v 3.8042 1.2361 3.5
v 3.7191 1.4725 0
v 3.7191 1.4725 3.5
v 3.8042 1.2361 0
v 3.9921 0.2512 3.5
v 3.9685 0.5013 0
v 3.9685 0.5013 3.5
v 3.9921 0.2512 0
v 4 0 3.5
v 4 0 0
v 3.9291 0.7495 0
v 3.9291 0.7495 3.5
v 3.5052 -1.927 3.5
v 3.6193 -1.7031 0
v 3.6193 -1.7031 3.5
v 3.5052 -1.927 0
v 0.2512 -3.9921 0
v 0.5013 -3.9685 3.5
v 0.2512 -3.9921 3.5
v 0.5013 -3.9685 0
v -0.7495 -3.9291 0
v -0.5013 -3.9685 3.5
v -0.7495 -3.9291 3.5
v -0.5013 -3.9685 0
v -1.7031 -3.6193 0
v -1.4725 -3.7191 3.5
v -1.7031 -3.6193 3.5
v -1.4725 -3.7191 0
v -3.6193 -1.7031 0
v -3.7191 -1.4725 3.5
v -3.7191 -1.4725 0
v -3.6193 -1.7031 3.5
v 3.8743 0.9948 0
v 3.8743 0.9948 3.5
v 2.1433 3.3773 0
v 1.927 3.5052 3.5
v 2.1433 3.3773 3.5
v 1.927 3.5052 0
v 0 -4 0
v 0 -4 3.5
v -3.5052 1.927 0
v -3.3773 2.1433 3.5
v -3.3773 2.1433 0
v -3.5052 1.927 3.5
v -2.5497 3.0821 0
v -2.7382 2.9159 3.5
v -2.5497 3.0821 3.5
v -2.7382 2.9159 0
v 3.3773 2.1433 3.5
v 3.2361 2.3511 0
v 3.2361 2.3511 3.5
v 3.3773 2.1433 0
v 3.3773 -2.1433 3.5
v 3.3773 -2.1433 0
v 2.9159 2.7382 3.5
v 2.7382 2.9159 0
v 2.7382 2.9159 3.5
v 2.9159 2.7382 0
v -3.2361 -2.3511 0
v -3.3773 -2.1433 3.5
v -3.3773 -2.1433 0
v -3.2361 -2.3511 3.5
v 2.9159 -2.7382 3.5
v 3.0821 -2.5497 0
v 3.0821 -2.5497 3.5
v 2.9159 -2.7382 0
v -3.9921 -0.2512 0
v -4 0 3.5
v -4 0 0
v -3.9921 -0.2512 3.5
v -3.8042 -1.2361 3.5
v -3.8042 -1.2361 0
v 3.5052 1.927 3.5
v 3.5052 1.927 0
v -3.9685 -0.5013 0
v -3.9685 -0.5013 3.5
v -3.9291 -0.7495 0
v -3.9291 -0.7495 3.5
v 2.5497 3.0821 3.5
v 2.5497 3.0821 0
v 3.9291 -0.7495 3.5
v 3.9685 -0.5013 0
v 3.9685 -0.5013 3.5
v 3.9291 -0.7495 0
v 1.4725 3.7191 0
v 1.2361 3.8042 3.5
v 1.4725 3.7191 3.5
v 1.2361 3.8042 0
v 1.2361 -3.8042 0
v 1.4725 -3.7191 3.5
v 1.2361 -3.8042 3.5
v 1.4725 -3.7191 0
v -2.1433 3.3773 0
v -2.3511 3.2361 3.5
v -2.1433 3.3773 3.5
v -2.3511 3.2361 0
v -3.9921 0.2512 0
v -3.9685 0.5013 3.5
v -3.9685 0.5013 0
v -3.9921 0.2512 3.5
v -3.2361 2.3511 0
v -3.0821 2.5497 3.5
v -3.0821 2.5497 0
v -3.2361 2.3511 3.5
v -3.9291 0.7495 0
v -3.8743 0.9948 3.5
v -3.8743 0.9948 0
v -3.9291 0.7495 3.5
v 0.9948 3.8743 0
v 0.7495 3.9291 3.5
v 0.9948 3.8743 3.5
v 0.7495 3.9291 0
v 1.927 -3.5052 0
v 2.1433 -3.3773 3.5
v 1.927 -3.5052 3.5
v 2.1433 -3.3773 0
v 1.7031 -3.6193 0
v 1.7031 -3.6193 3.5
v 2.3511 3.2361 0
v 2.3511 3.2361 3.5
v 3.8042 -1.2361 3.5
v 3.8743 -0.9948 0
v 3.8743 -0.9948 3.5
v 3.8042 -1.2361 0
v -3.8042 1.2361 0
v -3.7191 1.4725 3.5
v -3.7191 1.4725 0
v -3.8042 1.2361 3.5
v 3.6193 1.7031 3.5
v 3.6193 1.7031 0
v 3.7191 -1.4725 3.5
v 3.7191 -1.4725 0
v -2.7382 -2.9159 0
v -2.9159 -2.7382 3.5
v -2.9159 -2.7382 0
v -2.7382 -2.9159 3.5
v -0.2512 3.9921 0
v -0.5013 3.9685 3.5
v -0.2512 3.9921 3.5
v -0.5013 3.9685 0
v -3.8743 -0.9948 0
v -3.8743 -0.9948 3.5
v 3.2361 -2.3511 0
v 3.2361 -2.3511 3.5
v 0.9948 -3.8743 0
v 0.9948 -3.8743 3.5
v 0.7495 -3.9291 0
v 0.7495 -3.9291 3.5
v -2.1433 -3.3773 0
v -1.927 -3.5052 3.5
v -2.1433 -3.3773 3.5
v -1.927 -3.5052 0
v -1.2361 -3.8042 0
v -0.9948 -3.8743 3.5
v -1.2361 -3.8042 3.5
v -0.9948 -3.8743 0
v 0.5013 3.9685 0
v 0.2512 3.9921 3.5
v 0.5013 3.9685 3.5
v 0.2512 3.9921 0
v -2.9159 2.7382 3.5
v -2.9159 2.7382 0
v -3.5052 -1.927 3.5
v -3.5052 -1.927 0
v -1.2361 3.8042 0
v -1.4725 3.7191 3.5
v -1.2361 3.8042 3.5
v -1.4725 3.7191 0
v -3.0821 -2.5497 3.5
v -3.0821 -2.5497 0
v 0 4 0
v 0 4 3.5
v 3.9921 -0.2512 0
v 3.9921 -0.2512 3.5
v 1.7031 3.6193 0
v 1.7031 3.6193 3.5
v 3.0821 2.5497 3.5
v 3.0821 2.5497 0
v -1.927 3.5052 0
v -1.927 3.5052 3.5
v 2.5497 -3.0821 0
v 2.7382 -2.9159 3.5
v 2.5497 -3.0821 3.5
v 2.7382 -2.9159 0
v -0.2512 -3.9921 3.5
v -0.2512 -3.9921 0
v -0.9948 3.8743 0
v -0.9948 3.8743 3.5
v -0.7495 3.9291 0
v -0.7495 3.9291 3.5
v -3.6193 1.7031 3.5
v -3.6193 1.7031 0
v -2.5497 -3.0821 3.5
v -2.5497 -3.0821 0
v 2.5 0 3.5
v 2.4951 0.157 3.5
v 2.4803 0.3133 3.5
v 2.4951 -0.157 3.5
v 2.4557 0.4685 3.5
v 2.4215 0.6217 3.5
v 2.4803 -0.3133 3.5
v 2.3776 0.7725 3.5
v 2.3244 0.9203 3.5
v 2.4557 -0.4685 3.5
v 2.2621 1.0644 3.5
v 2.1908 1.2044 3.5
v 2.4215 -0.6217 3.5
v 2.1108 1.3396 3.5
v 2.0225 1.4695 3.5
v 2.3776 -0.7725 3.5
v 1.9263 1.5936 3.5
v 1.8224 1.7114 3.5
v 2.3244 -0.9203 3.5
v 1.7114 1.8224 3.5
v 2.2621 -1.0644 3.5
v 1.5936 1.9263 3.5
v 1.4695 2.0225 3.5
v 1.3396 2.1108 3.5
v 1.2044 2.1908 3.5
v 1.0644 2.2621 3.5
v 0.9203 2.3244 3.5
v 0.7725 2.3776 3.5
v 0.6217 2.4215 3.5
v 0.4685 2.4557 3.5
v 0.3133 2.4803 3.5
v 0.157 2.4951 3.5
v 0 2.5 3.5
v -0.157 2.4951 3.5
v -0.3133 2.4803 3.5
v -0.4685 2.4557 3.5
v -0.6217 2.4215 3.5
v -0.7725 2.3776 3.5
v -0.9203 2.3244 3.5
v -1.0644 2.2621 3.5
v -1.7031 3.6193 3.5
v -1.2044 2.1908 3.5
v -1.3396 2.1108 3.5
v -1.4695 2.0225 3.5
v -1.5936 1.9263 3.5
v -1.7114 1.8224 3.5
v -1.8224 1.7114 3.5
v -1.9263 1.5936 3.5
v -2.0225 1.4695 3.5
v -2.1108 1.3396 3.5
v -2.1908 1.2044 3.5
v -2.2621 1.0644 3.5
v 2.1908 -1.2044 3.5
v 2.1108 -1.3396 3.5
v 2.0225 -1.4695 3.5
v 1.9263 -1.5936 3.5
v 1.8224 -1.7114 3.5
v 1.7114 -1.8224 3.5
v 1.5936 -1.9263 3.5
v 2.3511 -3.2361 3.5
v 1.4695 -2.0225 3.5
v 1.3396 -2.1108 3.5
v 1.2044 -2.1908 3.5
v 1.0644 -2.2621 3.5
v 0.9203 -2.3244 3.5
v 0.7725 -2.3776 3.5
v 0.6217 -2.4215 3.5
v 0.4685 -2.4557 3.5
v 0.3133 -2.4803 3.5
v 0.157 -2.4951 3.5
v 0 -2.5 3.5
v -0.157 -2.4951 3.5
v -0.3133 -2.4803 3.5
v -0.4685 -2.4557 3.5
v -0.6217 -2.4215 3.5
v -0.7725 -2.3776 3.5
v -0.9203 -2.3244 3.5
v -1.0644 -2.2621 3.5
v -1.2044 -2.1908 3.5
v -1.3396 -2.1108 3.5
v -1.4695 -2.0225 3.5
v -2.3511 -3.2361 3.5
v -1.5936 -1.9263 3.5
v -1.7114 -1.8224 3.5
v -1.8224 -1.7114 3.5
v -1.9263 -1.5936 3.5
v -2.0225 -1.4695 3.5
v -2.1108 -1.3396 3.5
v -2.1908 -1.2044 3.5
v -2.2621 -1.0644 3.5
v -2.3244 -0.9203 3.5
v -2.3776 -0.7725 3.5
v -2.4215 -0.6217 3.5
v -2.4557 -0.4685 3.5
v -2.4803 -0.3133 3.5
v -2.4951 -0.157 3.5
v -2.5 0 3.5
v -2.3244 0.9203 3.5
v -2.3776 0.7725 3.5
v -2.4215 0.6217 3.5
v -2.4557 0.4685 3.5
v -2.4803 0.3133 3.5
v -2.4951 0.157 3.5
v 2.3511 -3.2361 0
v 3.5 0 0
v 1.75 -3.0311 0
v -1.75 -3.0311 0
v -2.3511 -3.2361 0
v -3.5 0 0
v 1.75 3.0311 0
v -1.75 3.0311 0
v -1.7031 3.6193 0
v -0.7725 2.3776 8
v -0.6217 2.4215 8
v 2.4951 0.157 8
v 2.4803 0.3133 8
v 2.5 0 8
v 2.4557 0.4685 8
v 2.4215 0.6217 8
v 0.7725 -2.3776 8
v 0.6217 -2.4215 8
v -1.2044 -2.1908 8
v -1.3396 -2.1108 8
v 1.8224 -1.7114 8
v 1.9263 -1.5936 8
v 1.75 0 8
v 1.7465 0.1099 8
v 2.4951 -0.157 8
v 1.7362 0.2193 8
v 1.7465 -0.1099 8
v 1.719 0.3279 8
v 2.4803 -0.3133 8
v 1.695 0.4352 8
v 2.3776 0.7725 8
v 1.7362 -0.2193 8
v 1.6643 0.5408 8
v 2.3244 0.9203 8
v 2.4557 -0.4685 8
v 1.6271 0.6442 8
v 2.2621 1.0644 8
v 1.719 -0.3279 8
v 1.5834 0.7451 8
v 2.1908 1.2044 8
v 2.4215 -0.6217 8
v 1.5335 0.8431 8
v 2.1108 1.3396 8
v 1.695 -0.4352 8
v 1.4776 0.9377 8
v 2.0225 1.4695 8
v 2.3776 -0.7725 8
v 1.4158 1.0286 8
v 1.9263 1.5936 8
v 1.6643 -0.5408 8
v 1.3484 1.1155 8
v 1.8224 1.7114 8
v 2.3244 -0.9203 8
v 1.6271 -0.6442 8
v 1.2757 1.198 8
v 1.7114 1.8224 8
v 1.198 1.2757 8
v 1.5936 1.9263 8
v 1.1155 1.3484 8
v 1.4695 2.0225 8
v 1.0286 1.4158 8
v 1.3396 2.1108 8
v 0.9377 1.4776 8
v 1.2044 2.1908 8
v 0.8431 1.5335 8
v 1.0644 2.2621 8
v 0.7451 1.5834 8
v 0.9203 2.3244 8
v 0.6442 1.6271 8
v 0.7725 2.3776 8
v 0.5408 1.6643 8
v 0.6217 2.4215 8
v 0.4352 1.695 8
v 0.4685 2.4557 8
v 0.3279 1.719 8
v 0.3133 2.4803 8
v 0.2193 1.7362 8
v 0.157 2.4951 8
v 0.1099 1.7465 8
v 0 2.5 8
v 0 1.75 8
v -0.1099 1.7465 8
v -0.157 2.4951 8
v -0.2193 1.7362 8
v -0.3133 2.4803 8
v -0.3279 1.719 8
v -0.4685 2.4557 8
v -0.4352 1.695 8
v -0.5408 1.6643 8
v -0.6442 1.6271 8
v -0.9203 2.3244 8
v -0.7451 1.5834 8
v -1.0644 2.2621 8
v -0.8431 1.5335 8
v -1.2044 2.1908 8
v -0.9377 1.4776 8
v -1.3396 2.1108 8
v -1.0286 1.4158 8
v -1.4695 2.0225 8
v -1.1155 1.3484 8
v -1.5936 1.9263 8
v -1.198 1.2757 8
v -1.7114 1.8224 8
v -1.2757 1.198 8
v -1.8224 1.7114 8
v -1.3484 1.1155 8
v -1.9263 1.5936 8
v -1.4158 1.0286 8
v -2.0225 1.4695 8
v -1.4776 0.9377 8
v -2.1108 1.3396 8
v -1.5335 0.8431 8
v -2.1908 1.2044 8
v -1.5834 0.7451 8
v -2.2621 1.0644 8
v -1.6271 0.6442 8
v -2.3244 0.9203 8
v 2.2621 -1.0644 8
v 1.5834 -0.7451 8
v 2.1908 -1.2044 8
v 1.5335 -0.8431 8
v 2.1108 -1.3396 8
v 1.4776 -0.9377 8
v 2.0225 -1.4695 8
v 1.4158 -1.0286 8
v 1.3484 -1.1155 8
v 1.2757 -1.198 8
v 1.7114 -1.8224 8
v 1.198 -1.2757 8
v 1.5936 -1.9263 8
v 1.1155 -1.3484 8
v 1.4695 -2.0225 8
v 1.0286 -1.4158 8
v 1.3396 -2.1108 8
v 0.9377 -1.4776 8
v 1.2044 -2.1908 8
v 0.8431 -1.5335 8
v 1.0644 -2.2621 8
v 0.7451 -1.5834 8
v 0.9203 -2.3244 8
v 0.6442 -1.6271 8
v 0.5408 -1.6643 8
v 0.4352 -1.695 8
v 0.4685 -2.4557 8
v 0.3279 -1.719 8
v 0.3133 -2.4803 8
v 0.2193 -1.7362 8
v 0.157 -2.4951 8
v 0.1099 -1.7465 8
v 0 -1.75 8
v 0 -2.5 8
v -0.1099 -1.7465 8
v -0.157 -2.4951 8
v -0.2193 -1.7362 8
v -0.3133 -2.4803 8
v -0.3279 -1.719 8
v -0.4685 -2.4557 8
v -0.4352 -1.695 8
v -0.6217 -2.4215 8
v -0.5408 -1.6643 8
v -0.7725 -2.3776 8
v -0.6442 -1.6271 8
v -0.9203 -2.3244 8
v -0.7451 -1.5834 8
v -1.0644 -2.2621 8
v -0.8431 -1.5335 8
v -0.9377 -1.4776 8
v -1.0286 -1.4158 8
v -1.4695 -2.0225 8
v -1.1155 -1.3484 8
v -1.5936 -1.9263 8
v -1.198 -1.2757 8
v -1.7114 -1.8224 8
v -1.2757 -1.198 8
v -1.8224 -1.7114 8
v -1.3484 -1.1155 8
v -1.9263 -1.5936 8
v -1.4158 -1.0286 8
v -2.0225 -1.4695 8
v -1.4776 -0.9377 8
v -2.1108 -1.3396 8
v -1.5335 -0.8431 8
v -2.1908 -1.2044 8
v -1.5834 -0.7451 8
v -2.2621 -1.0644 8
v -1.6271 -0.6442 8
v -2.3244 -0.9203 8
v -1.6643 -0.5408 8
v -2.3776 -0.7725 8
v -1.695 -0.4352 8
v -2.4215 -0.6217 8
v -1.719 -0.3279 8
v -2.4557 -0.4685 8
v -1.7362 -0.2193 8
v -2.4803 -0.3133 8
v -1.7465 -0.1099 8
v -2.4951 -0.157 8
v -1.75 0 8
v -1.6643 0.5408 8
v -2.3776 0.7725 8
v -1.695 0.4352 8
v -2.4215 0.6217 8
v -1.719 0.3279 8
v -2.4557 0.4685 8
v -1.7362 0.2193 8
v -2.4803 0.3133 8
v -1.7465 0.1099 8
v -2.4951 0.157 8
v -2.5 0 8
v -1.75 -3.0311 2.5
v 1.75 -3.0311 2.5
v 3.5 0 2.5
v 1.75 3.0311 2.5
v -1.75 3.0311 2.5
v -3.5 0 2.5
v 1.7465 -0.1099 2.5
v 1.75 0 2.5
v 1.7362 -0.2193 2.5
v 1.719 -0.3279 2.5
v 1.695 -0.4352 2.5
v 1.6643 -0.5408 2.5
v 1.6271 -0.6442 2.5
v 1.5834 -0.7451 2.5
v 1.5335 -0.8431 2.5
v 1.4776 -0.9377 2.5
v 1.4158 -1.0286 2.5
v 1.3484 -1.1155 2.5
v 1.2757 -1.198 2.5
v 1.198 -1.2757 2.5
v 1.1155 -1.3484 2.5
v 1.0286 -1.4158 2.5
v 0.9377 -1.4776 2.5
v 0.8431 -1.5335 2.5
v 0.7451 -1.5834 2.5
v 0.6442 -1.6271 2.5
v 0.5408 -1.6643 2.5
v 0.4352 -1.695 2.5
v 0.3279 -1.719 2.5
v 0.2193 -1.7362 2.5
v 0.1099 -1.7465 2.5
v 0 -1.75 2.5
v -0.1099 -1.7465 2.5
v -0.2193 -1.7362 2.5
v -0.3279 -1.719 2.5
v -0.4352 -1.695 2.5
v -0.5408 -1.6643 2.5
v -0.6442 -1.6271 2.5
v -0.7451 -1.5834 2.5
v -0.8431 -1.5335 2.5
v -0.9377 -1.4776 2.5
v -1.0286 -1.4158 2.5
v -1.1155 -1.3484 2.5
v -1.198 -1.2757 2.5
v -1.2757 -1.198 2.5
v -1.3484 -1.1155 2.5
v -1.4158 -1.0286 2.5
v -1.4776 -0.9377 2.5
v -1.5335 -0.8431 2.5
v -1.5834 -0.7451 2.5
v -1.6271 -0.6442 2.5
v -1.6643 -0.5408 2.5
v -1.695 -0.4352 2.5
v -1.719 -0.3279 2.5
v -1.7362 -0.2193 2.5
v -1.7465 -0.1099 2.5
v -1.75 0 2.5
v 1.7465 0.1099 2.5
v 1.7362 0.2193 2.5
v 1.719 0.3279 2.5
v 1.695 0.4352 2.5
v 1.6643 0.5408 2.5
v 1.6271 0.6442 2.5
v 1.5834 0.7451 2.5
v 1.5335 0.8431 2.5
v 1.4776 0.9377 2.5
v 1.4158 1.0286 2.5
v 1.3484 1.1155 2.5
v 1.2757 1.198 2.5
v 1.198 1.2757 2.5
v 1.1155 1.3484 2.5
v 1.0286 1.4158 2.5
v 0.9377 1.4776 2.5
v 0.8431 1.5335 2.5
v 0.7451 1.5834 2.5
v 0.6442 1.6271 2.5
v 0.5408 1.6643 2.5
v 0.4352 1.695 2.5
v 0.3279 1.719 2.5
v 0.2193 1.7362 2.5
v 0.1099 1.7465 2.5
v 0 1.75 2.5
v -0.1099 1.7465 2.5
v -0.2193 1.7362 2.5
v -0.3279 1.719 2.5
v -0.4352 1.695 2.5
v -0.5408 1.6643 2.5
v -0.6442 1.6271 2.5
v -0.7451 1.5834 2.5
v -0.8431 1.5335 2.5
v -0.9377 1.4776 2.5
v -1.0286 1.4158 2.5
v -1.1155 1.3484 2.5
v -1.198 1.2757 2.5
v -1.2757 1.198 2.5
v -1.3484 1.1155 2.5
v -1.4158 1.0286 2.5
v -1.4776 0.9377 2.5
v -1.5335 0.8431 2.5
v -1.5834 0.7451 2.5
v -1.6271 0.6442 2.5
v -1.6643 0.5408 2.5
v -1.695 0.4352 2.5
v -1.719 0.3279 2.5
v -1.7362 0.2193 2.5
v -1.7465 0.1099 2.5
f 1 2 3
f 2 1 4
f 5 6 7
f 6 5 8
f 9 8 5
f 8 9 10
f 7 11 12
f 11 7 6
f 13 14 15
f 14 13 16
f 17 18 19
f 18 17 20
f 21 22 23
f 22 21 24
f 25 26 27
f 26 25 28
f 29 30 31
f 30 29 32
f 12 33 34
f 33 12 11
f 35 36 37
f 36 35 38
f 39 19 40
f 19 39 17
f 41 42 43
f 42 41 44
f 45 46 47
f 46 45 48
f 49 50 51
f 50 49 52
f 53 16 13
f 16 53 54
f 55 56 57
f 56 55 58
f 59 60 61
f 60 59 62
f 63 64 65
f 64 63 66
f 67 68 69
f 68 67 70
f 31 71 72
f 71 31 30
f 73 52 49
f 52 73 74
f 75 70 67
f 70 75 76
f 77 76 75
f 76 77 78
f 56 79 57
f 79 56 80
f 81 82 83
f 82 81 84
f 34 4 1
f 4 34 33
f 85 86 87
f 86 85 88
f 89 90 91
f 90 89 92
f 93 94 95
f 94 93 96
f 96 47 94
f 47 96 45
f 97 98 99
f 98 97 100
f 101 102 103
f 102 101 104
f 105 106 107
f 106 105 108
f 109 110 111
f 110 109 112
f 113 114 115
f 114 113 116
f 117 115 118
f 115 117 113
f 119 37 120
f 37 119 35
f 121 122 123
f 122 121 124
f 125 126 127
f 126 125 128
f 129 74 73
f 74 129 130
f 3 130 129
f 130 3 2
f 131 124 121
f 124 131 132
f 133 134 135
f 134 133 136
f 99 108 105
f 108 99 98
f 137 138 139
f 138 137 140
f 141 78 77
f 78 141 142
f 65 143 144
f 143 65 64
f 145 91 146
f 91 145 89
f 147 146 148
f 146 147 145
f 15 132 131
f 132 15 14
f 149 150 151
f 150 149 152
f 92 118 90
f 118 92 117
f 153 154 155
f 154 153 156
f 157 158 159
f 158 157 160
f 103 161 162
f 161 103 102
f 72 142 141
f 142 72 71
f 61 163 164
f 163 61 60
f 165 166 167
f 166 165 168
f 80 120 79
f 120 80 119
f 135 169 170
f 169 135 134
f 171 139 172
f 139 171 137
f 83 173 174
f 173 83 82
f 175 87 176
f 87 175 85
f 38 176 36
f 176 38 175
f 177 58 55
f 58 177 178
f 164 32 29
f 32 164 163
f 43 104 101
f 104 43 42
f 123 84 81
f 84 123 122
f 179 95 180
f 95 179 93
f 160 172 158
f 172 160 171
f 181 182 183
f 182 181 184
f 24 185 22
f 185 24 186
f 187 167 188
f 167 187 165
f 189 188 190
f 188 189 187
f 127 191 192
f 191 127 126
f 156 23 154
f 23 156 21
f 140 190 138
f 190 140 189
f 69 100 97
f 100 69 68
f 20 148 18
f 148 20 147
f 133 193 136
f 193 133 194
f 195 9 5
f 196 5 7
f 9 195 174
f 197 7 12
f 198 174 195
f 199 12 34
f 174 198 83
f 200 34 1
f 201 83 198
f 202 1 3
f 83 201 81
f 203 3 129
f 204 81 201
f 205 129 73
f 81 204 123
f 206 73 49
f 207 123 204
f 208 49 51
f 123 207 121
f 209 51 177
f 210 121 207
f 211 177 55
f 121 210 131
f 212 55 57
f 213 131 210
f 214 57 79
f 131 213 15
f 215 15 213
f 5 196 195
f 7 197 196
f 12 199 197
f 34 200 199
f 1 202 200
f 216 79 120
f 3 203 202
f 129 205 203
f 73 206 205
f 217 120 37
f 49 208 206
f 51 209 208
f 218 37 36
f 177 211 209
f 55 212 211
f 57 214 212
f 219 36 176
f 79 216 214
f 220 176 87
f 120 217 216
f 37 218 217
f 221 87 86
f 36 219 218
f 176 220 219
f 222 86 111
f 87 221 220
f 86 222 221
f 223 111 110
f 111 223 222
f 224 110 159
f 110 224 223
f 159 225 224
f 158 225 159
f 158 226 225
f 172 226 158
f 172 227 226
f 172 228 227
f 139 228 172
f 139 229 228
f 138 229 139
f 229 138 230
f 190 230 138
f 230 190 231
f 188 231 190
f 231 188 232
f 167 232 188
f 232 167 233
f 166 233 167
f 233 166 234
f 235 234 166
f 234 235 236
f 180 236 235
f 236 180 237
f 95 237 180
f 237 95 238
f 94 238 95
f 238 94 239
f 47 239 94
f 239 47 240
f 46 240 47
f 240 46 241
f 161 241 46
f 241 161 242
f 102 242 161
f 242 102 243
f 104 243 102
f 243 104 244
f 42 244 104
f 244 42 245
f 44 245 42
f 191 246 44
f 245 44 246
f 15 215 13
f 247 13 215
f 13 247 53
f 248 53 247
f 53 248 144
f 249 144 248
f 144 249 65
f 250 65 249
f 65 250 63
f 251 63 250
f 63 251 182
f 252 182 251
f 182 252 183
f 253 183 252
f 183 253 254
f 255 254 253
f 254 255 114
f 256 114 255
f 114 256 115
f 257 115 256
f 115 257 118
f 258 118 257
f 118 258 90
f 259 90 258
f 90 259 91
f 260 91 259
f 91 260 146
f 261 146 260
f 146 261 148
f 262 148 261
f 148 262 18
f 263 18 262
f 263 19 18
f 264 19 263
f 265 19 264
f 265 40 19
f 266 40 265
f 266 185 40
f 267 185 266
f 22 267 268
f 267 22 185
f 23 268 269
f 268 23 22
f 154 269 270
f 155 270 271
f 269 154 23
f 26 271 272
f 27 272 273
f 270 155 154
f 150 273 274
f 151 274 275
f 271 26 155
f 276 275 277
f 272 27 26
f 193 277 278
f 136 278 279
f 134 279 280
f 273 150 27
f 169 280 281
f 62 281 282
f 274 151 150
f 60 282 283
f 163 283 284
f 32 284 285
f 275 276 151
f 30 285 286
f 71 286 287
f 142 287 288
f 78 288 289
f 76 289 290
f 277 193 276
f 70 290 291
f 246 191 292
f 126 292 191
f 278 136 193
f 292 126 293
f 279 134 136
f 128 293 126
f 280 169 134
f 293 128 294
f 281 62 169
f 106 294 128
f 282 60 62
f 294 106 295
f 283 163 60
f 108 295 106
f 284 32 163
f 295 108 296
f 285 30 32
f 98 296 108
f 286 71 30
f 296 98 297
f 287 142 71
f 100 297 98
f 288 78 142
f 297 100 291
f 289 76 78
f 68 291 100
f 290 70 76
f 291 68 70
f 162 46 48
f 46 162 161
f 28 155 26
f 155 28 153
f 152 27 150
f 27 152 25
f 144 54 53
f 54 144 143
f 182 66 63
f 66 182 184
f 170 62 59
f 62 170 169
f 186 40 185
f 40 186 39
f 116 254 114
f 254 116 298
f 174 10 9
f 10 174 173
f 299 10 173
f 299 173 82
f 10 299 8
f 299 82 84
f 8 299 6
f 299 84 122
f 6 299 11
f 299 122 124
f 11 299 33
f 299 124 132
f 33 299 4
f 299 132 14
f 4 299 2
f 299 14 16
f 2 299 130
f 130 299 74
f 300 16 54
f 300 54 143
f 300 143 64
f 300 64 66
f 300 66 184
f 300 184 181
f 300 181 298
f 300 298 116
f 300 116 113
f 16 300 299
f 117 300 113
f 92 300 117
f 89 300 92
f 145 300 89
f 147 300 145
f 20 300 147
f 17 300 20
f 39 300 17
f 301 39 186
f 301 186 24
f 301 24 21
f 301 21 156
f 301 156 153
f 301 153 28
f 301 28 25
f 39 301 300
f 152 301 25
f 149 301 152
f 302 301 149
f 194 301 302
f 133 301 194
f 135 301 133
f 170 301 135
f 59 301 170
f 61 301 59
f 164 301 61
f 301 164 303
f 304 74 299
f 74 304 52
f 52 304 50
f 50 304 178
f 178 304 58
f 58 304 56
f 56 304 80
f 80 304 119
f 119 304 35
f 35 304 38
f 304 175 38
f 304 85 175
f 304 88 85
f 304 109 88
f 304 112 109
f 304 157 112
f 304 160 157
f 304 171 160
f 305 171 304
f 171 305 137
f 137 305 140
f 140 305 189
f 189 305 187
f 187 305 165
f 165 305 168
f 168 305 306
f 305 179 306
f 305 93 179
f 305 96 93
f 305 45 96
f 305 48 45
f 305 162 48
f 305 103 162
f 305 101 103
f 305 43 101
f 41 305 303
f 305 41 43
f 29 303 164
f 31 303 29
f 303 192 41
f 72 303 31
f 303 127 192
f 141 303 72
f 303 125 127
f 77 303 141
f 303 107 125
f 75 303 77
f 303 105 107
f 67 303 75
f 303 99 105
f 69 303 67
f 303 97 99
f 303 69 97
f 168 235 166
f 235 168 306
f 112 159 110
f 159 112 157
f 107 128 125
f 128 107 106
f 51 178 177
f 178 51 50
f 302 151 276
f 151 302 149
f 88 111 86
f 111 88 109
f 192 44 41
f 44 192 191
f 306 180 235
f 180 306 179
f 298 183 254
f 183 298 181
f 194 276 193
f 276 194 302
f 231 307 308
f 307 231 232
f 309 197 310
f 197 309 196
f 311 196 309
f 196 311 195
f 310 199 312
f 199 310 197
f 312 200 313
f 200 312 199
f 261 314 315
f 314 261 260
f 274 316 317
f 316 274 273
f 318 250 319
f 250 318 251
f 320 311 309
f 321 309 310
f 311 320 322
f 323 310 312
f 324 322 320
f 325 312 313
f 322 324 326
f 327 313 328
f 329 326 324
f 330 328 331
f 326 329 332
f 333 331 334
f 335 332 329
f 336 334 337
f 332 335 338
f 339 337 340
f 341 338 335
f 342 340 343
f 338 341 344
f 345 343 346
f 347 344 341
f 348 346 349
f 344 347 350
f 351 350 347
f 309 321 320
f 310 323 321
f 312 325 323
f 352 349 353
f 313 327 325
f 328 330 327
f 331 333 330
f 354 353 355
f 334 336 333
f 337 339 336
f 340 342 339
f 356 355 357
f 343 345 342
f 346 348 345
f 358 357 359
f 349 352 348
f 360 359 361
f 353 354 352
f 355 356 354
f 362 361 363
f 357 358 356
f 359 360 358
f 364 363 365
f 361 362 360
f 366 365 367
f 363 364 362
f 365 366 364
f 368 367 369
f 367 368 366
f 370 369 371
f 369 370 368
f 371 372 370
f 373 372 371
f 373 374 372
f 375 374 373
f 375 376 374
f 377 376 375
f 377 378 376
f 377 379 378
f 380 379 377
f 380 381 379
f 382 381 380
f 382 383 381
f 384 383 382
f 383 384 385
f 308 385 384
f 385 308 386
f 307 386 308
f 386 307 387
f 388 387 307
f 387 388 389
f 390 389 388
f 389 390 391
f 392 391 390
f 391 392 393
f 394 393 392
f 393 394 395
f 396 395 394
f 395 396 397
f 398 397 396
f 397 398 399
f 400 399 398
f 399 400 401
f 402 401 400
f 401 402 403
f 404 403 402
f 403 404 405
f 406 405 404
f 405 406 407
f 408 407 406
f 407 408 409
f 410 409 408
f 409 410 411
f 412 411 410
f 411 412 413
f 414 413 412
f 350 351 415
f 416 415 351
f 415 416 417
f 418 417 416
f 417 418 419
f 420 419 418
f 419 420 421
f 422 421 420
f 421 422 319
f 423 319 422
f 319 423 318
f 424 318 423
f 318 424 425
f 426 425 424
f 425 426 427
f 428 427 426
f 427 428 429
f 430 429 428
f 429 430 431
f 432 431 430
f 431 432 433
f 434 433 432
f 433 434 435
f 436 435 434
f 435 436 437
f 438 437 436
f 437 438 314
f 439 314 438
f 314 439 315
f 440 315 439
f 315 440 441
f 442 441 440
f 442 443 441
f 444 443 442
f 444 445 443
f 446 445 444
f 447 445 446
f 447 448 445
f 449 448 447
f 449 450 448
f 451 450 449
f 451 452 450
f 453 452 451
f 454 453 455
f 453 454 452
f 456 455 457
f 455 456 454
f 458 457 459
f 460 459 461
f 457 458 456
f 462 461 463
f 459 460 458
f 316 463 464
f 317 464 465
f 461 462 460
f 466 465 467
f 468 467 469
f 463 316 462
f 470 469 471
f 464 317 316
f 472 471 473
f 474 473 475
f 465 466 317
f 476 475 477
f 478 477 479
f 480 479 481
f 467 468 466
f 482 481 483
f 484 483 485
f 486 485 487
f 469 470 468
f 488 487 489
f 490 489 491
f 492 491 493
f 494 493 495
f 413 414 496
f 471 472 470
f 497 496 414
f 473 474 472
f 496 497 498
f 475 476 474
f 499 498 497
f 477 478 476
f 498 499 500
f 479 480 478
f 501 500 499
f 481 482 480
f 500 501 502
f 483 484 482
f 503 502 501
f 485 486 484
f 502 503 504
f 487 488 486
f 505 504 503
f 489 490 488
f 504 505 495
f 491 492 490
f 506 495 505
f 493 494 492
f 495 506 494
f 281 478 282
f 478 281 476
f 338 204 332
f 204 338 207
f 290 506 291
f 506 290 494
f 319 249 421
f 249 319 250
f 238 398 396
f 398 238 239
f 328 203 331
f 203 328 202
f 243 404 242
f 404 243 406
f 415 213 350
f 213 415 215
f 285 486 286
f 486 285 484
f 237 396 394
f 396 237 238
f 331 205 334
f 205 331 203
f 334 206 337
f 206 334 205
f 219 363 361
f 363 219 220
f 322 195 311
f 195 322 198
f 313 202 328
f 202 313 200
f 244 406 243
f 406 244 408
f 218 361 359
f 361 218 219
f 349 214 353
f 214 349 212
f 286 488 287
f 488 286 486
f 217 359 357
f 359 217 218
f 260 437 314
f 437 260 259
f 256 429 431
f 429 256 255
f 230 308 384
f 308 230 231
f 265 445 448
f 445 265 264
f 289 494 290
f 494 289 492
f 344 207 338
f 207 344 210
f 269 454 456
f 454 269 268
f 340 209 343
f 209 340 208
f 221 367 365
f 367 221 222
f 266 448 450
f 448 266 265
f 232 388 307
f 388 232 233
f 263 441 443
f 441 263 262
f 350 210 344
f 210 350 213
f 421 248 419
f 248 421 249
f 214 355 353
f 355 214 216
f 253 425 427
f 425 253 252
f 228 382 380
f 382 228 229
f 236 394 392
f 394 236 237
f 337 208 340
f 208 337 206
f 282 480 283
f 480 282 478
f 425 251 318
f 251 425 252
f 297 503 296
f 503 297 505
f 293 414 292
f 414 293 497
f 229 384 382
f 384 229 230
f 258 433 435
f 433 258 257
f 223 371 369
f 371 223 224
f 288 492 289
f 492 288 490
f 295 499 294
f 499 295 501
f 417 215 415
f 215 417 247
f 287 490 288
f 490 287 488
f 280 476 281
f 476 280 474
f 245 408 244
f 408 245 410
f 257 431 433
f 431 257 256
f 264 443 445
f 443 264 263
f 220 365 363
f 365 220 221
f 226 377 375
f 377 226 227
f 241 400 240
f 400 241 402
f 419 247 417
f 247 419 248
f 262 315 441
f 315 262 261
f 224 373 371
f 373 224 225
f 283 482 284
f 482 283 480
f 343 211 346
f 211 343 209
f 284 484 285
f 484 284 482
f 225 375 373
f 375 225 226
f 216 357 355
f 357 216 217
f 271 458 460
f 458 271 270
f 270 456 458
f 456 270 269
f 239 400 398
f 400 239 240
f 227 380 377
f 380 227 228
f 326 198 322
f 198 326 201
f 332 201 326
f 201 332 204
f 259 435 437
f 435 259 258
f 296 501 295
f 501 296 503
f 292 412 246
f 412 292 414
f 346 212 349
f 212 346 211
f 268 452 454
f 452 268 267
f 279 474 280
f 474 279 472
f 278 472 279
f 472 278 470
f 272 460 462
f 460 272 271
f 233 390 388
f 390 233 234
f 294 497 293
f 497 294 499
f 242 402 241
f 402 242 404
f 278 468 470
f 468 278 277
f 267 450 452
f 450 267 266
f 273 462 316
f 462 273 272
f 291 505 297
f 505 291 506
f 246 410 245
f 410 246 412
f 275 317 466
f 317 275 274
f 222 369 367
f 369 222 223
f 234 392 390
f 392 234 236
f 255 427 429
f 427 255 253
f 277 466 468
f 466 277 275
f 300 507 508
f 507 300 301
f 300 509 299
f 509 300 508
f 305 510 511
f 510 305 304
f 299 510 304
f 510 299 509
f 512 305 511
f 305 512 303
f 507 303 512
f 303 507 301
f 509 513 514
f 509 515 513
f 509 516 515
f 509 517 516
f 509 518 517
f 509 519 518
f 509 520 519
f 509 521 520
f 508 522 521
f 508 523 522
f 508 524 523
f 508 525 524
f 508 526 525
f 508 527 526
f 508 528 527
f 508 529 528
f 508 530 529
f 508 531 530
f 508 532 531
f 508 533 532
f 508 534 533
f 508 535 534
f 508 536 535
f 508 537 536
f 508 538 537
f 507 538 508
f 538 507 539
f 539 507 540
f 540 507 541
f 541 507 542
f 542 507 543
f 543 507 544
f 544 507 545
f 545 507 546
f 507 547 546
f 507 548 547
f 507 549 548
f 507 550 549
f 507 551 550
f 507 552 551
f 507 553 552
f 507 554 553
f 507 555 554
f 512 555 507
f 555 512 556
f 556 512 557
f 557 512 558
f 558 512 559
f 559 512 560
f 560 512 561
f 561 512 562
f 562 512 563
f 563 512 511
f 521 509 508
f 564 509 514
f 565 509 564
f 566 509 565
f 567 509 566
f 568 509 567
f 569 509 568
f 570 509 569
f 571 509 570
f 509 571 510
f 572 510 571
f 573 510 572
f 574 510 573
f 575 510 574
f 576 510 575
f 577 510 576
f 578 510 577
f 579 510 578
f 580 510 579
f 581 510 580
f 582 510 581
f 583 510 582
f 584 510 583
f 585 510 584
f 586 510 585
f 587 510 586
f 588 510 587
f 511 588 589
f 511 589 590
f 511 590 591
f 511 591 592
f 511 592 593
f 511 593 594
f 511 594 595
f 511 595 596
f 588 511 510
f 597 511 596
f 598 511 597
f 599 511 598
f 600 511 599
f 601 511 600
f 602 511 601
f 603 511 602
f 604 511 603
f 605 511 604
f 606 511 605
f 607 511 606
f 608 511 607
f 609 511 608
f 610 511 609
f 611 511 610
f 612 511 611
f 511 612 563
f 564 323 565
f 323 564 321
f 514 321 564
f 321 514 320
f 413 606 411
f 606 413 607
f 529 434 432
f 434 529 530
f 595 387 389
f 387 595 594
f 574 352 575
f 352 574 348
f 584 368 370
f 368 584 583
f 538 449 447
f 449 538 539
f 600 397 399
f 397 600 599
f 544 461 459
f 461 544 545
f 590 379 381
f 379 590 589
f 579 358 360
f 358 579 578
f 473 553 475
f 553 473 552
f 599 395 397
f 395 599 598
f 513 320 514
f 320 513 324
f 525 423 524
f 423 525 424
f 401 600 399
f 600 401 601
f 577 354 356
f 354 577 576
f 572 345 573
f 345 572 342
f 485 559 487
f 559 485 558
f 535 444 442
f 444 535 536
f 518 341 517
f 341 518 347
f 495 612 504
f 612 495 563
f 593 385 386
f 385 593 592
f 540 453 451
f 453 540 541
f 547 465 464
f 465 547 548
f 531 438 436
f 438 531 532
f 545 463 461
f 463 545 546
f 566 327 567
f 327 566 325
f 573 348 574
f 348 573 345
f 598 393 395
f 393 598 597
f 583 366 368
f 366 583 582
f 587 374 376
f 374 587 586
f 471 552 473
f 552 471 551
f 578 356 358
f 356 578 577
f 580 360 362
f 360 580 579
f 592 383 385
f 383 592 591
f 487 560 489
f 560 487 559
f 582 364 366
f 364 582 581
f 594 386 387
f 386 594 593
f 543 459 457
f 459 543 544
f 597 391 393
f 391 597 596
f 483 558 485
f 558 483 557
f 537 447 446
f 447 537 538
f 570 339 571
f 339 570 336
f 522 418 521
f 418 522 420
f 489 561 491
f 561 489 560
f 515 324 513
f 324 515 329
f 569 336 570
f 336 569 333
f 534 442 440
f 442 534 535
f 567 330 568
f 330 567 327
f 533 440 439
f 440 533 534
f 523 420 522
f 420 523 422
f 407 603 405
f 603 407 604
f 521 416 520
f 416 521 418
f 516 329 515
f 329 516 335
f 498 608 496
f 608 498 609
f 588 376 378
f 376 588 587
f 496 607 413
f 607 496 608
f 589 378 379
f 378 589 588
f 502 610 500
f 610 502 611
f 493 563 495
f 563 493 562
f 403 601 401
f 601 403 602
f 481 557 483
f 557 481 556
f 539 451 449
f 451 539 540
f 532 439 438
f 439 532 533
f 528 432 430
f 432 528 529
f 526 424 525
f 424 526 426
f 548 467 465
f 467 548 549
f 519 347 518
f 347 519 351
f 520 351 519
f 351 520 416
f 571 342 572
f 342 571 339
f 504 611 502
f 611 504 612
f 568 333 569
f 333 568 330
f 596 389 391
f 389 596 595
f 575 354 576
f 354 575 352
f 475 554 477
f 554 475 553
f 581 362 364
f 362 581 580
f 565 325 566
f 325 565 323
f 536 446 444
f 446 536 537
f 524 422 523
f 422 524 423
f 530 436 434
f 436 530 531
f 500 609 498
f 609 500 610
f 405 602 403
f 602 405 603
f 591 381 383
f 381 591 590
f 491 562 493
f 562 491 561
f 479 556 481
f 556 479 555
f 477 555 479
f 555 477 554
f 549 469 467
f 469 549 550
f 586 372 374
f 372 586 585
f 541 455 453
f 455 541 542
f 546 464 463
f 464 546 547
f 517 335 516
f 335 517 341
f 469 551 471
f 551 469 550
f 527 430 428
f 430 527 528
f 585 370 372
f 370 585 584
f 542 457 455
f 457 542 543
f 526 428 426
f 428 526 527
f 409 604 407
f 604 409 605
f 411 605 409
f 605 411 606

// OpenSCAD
$fn=100;

difference() {
    union() {
        
        cylinder(h = 3.5, r = 4);
        translate([0, 0, 3.5]) cylinder(h = 4.5, r = 2.5);
    }
    cylinder(h = 2.5, r =3.5, $fn=6);
    cylinder(h = 9, r = 1.75);
}
